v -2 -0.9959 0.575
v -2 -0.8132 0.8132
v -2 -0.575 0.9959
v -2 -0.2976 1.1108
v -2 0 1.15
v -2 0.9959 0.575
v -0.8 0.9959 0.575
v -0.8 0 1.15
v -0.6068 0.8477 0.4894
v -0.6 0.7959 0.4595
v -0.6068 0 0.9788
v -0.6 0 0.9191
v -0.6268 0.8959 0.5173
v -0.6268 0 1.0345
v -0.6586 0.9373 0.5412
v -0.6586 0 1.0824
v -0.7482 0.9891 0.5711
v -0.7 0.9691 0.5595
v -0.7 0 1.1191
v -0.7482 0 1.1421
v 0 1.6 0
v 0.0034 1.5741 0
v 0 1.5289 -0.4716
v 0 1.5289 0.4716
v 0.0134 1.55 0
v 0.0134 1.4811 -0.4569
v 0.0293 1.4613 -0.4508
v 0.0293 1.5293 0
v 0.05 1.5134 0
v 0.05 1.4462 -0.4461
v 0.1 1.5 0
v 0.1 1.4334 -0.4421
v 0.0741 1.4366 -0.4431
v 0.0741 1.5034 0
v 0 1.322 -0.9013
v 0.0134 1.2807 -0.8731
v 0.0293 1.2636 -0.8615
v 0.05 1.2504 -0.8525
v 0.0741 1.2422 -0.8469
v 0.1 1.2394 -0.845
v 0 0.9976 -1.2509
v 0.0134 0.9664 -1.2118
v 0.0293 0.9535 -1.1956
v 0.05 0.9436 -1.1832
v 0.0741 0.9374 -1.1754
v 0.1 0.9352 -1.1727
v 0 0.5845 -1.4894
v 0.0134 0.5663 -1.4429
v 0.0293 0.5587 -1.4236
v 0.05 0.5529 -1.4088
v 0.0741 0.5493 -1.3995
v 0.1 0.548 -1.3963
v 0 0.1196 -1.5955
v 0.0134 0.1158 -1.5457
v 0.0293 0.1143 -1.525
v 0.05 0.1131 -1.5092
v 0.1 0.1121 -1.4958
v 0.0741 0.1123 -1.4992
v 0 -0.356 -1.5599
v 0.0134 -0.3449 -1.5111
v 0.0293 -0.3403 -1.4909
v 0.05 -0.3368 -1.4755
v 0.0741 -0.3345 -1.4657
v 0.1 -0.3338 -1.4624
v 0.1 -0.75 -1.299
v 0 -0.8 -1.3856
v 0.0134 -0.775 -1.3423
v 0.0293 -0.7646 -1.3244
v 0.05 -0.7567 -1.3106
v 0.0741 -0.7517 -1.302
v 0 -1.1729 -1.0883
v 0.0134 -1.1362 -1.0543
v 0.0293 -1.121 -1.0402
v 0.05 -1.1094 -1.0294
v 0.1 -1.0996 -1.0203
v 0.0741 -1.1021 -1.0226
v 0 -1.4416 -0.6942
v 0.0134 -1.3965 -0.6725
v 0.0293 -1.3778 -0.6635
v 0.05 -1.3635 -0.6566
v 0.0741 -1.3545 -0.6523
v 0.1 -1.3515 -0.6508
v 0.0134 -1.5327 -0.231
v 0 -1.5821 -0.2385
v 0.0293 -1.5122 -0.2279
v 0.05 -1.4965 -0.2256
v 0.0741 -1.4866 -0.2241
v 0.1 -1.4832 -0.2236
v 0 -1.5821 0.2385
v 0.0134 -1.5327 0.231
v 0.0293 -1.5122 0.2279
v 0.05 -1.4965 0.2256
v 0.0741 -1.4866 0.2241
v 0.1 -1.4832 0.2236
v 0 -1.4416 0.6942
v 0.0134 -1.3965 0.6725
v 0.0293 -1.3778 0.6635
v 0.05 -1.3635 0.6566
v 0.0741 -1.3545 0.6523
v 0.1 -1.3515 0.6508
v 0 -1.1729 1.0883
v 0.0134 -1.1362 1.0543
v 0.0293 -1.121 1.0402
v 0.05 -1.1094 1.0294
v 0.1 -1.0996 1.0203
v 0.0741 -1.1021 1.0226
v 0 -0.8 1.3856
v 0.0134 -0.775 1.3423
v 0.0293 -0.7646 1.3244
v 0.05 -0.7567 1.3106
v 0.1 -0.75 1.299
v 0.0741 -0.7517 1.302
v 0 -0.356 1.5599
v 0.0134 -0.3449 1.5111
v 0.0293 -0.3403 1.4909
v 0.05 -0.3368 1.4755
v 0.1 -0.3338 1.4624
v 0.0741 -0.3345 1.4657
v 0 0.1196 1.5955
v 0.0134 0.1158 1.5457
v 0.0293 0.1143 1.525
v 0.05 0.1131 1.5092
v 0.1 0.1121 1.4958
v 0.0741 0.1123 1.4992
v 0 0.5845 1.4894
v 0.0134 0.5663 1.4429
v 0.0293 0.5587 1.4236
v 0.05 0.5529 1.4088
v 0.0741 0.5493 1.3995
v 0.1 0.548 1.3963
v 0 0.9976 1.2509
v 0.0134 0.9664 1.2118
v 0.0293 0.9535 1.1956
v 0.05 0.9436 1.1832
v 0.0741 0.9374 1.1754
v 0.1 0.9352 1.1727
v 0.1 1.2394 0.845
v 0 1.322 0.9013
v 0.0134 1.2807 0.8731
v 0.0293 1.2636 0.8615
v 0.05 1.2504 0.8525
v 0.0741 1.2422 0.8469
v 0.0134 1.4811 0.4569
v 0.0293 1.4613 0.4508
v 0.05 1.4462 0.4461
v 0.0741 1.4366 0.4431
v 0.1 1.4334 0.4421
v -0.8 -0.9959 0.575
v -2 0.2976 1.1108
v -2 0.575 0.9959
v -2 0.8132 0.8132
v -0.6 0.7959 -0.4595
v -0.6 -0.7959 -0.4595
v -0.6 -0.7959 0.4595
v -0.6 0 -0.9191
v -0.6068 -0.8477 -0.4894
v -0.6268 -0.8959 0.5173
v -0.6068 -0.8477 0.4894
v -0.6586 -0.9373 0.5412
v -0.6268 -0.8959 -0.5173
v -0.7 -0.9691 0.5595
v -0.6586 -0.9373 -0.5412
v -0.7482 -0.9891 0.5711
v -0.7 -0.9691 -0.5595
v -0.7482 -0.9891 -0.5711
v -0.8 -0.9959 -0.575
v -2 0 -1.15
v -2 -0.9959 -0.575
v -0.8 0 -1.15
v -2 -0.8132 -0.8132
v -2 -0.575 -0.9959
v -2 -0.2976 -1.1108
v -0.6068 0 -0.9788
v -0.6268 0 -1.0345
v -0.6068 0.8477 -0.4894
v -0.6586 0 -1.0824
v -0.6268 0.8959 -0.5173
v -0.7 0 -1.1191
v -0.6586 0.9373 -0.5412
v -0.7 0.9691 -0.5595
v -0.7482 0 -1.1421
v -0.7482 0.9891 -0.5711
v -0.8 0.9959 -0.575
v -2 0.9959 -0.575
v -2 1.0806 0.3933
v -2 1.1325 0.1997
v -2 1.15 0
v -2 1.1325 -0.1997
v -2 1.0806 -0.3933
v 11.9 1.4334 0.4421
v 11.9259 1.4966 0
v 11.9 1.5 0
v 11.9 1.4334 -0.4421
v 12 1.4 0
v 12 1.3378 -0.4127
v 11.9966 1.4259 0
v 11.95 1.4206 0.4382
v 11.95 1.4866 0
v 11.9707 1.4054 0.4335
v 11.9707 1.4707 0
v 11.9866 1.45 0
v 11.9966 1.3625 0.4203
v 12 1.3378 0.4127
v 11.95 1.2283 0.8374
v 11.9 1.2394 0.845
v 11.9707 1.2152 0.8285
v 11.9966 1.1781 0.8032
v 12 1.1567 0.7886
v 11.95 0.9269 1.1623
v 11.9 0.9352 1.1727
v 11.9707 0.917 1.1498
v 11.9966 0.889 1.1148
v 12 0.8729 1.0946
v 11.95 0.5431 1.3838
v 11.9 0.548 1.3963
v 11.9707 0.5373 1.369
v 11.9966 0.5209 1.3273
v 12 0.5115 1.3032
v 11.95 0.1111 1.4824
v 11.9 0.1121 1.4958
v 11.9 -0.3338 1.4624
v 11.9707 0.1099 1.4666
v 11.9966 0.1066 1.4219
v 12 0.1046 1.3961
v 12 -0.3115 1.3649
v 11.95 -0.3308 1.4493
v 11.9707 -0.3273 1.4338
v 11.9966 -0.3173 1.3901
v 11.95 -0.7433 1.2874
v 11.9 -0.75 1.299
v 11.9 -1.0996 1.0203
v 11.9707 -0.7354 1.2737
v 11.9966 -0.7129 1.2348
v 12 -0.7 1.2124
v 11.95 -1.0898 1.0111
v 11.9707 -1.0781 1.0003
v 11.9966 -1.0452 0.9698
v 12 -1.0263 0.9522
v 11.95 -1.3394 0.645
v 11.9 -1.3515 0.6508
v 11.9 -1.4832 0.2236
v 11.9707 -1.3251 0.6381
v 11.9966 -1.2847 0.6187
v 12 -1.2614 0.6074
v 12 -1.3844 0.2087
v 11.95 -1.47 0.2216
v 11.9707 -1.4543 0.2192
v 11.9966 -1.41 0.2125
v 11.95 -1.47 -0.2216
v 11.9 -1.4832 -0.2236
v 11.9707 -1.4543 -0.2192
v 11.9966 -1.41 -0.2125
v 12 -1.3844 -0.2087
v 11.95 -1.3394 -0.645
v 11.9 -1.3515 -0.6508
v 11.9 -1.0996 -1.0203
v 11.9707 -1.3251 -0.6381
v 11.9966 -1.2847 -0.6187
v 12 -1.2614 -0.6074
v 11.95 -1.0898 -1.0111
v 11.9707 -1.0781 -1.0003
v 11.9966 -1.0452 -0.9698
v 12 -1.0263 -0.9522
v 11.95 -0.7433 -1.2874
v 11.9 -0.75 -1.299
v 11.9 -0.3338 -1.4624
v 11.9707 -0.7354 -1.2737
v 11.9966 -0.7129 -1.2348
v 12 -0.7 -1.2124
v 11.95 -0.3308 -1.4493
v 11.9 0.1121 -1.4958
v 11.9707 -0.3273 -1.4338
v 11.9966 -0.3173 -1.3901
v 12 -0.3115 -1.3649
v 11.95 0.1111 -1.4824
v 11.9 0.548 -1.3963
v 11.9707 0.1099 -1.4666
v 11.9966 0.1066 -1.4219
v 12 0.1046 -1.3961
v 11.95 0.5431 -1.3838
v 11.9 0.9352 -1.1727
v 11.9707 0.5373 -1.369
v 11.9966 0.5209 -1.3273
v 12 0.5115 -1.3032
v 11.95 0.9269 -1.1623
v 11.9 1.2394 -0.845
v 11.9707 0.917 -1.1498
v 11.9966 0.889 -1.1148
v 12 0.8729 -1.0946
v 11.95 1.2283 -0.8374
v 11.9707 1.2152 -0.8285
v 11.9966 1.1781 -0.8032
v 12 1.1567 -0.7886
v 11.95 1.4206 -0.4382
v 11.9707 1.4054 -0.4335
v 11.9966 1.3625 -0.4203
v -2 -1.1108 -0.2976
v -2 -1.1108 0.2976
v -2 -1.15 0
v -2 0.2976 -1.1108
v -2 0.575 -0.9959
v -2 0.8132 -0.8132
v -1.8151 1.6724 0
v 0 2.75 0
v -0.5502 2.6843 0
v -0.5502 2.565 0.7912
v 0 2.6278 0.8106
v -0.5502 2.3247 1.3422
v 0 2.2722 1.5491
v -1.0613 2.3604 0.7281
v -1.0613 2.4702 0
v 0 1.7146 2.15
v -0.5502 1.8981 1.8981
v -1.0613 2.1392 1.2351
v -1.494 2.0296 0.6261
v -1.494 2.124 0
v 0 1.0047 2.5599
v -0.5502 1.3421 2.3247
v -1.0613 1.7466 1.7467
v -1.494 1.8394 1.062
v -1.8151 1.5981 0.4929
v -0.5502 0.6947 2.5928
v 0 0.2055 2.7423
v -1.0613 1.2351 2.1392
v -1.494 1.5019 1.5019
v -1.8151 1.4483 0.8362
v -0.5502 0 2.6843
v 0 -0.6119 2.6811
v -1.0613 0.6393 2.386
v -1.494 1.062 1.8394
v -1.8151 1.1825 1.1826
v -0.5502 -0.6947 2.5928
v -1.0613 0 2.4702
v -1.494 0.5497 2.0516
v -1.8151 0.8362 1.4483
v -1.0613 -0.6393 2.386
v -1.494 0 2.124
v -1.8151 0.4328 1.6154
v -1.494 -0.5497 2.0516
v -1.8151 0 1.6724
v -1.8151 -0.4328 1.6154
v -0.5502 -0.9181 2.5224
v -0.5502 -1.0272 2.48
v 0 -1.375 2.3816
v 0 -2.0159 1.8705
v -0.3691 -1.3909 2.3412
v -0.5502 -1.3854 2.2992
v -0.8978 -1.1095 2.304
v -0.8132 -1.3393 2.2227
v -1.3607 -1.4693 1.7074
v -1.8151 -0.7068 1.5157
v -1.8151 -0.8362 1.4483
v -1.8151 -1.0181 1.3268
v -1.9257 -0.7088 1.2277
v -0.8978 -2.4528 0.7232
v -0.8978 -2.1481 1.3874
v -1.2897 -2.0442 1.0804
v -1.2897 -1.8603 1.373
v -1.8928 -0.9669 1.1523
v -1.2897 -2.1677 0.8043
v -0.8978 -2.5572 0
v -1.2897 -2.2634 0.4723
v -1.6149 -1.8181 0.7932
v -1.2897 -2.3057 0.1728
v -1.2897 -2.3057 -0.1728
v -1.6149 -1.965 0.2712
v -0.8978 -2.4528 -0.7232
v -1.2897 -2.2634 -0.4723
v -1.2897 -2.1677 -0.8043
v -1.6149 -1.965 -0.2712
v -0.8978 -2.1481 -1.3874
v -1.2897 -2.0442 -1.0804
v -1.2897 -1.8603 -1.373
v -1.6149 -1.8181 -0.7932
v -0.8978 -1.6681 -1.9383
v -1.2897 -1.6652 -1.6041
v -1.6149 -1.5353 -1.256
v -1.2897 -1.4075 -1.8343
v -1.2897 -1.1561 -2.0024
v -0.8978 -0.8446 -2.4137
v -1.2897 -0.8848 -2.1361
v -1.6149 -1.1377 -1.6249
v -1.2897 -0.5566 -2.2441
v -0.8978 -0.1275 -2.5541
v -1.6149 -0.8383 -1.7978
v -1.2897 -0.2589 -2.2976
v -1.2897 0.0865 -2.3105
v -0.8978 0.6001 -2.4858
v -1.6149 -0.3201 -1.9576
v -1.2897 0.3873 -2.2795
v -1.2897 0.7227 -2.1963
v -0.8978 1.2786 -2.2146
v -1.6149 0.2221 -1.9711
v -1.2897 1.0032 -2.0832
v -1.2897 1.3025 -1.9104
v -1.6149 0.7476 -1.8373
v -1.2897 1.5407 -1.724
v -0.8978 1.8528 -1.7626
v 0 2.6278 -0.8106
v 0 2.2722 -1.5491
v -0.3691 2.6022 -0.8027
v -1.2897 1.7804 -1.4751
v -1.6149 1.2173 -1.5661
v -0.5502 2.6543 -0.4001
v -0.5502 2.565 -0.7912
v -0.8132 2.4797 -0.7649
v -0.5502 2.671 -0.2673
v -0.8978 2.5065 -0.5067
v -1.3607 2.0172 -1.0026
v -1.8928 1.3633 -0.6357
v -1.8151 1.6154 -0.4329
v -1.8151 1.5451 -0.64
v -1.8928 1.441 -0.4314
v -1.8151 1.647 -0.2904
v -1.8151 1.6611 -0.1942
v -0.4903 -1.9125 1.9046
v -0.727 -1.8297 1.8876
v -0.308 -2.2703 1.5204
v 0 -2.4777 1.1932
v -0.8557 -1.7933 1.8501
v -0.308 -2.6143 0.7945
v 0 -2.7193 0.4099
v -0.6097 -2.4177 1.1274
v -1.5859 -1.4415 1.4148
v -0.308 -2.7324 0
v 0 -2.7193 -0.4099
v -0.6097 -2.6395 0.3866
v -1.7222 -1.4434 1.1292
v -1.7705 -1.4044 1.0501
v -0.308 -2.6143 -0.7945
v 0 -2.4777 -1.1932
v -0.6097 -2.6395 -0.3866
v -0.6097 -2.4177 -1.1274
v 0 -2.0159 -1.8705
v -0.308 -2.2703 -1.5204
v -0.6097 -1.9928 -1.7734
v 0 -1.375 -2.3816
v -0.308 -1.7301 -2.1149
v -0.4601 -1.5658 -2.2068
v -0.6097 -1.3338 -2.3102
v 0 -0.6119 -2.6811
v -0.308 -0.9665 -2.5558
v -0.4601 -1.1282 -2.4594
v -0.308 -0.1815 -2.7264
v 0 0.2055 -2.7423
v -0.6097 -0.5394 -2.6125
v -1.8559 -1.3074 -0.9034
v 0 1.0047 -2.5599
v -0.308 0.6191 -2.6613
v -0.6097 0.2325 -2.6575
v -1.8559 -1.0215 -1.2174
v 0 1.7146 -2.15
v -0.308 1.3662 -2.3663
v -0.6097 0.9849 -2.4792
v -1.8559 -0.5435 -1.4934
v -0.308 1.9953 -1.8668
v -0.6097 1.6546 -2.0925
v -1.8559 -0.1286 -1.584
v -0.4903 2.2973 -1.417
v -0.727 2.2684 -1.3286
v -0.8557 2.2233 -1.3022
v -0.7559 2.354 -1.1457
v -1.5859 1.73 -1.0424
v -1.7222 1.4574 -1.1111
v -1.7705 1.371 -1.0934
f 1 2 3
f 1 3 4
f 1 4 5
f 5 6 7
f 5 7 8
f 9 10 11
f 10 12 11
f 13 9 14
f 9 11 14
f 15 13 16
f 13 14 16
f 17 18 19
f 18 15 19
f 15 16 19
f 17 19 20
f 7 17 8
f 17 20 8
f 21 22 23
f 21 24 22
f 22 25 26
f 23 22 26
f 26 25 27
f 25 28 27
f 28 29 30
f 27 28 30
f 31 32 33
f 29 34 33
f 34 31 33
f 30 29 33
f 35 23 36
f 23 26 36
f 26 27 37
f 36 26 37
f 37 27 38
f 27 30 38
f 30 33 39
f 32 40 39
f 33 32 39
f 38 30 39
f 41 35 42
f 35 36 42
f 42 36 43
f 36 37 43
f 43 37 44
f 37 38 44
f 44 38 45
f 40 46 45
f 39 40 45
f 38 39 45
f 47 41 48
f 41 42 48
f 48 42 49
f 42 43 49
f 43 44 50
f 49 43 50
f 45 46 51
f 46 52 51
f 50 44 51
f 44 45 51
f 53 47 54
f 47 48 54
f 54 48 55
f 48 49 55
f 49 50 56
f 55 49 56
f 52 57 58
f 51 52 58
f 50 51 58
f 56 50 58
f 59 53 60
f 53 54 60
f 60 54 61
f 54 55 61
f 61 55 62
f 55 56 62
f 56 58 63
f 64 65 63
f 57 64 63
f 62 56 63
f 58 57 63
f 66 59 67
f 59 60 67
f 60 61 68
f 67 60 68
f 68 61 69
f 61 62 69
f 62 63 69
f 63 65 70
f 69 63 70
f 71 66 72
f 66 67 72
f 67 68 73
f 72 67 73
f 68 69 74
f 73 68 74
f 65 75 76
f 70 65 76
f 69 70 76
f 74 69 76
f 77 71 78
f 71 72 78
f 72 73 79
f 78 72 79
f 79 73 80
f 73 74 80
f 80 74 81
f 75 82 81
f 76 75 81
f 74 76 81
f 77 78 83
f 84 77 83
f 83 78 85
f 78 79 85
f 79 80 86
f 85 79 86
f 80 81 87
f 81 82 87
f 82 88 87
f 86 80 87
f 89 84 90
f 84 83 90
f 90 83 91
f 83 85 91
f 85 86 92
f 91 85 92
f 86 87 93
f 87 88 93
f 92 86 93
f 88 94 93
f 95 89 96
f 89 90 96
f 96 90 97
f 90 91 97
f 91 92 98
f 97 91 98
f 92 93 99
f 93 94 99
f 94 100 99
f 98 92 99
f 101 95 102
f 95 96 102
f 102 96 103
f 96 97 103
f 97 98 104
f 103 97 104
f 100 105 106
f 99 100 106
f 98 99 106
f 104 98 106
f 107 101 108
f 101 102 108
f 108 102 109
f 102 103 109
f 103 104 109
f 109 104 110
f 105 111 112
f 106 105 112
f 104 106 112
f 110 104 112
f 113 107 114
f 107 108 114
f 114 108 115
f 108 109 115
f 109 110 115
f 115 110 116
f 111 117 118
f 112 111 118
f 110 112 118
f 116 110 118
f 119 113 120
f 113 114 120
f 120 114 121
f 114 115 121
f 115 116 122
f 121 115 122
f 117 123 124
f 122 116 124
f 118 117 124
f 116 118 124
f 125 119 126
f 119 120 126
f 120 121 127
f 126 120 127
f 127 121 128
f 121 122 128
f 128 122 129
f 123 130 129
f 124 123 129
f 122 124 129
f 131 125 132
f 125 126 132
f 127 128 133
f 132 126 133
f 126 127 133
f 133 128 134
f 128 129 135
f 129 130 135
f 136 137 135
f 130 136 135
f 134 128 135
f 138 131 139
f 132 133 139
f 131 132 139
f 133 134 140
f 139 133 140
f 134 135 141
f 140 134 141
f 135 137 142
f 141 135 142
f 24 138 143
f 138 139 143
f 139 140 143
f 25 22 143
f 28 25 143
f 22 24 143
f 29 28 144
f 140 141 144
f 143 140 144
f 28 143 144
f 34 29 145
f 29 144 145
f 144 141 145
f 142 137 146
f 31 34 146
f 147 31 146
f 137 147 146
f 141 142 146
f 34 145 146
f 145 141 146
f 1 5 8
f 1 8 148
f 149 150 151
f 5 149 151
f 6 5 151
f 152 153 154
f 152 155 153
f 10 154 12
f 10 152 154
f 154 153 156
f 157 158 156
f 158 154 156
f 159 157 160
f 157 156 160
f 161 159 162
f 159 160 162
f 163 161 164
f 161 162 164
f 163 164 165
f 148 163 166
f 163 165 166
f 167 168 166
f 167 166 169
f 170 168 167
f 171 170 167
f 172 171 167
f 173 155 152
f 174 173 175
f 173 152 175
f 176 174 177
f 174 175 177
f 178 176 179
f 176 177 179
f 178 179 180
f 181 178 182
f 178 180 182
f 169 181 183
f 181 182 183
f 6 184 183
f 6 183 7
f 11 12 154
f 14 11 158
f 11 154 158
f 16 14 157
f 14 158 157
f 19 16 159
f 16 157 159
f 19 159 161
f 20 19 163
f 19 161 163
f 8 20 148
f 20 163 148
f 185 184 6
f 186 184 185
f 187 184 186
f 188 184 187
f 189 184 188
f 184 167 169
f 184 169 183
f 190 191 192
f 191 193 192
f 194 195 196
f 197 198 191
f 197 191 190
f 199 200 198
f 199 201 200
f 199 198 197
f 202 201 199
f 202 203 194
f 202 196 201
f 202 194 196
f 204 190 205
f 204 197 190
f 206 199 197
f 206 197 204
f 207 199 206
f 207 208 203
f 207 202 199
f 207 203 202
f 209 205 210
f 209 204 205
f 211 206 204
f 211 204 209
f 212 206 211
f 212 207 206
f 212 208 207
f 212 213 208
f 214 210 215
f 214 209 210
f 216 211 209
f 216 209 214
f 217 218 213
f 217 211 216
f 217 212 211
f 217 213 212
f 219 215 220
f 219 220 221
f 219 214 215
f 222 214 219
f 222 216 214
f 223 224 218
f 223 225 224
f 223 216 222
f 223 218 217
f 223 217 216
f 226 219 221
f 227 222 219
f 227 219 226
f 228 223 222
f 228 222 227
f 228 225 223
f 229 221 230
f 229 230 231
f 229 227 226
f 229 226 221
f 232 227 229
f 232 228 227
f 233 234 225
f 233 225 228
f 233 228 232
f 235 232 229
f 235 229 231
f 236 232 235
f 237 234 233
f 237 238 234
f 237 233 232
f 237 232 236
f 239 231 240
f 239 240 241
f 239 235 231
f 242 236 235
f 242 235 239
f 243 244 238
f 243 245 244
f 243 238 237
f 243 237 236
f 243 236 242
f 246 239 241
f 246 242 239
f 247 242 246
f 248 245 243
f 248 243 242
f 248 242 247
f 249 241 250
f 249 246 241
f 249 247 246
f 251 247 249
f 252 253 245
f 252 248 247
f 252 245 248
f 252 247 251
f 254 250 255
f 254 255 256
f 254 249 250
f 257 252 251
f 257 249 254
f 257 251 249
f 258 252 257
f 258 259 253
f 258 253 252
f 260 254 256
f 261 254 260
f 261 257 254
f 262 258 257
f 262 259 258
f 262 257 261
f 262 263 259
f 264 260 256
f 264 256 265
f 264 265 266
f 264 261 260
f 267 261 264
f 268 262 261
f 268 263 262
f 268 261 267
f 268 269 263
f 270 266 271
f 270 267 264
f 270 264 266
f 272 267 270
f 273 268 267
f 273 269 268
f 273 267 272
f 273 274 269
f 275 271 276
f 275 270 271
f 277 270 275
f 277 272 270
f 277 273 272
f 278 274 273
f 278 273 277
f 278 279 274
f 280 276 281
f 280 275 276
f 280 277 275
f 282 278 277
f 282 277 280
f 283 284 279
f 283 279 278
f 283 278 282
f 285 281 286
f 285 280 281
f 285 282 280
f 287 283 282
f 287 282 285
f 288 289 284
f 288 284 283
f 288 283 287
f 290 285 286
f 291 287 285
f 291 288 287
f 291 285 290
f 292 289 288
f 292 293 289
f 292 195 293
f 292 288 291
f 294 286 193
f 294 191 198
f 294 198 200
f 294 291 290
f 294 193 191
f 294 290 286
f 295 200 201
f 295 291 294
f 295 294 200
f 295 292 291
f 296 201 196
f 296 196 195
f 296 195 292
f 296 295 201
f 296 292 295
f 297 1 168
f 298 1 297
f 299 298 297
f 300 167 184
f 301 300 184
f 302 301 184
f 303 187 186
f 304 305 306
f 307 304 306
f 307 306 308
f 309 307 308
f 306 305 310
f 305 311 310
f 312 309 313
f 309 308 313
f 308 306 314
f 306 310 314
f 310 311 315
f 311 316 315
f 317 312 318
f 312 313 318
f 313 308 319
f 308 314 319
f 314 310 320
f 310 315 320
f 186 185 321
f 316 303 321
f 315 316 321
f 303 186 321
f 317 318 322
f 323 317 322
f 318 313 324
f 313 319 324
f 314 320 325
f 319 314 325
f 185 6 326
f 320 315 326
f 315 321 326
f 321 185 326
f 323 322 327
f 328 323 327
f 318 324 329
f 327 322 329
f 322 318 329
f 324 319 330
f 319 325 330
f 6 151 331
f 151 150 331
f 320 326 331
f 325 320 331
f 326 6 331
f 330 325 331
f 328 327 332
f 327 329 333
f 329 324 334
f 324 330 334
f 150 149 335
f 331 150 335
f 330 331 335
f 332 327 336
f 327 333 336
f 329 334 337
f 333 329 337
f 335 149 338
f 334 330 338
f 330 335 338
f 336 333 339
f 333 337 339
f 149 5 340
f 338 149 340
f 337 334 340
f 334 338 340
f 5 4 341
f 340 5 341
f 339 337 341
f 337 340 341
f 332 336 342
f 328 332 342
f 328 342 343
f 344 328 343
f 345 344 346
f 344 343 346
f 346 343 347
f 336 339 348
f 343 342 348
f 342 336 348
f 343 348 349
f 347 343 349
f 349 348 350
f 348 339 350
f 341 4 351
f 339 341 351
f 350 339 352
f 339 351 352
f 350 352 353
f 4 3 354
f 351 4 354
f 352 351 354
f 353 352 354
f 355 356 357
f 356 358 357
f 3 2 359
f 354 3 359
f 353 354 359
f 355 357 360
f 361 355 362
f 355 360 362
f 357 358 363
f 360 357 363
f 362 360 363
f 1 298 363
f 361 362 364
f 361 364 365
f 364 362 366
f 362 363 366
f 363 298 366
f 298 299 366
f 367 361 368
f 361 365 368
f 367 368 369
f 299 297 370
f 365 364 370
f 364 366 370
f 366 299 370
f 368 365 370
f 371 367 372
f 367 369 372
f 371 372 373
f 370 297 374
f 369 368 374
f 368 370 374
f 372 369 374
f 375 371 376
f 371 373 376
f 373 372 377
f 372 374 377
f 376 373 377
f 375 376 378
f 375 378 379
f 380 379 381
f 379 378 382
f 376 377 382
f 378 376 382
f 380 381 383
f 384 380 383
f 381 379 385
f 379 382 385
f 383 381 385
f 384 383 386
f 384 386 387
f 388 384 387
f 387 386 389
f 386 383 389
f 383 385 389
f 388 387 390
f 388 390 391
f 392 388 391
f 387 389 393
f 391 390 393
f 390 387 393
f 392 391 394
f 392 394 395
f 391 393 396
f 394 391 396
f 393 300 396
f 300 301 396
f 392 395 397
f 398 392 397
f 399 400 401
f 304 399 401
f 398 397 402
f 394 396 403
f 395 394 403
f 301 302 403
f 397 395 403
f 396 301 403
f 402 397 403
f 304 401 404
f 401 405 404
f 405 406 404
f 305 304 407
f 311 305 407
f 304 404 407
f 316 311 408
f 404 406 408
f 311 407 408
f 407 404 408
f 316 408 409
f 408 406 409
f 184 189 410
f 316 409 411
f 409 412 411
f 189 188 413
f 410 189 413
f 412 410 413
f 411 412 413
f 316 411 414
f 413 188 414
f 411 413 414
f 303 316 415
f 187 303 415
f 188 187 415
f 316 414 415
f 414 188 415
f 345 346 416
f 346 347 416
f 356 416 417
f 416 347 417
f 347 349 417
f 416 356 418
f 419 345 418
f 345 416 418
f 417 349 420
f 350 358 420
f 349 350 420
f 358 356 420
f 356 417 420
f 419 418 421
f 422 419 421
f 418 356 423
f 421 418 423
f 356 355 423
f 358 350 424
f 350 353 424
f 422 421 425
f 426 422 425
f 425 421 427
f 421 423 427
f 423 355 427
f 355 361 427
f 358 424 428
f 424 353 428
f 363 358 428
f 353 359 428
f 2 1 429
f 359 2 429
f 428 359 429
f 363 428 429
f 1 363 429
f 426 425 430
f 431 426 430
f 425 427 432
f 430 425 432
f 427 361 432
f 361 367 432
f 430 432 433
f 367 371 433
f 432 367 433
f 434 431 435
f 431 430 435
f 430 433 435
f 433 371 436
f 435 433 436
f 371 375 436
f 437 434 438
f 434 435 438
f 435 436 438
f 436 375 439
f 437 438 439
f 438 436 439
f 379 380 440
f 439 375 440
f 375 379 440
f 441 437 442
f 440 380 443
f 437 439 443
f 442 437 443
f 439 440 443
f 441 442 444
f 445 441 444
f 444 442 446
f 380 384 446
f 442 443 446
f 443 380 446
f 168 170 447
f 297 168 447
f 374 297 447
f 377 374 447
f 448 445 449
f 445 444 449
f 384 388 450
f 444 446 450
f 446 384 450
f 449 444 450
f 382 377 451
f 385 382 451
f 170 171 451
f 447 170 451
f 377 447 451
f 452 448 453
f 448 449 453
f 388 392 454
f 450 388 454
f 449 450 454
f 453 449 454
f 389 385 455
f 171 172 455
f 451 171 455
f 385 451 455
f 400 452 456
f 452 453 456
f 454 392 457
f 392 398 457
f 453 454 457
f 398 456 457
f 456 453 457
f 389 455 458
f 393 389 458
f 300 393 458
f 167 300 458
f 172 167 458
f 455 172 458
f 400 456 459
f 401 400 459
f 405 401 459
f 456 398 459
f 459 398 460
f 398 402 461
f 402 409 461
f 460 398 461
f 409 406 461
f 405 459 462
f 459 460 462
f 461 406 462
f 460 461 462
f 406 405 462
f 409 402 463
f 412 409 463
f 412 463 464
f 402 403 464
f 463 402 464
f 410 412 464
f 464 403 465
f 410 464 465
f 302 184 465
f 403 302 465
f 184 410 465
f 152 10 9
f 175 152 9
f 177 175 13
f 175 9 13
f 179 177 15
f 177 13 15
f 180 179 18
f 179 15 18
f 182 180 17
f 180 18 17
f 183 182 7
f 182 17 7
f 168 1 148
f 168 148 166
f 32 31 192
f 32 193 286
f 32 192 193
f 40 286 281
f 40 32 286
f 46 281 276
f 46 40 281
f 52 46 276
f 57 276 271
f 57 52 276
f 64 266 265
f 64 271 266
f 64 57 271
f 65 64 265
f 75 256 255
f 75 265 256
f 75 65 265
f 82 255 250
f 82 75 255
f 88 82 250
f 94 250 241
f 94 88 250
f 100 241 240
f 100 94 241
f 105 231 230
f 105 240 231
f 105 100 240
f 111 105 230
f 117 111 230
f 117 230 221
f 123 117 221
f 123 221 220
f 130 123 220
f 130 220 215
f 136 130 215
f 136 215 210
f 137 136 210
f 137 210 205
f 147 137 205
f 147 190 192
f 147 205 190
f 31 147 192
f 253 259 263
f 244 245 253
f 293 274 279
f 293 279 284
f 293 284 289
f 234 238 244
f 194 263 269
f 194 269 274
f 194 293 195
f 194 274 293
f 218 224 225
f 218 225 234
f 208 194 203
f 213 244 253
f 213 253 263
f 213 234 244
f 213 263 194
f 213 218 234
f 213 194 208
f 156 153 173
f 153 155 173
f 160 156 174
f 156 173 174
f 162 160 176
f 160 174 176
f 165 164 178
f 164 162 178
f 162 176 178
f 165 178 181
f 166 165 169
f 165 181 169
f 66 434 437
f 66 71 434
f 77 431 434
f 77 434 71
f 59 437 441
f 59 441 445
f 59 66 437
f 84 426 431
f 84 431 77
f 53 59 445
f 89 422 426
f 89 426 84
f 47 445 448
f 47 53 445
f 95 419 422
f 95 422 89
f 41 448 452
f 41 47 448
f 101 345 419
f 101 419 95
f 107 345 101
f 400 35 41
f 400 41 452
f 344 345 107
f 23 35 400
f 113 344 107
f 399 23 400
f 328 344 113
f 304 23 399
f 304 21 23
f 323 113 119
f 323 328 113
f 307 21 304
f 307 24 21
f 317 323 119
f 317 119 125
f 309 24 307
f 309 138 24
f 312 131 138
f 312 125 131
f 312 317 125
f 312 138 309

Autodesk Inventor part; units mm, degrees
ref_plane "YZ Plane" through (0, 0, 0) normal (1, 0, 0) x (0, 1, 0)
ref_plane "XZ Plane" through (0, 0, 0) normal (0, 1, 0) x (-1, 0, 0)
ref_plane "XY Plane" through (0, 0, 0) normal (0, 0, 1) x (1, 0, 0)
sketch "スケッチ1" plane through (0, 0, 0) normal (0, 0, 1) x (1, 0, 0)
  line L0 (0, 0) -> (12, 0)
  line L1 (12, 0) -> (12, 1.5)
  line L2 (12, 1.5) -> (0, 1.5)
  line L3 (0, 1.5) -> (0, 0)
  line L4 (0, 0) -> (0, 2.75)
  line L5 (0, 0) -> (-2, 0)
  line L6 (-2, 0) -> (0, 0)
  line L7 (-2, 0) -> (-2, 1.15)
  arc A0 (0, 2.75) -> (-2, 1.15) centre (-0.0403, 0.7504) ccw
  dimension "d0" = 1.5
  dimension "d1" = 12
  dimension "d3" = 2
  dimension "d4" = 2.75
  dimension "d5" = 1.15
  dimension "d6" = 2
revolve "回転1" add sketch "スケッチ1" angle 360 about axis through (-2, 0, 0) along (1, 0, 0)
thread "ねじ1" size "M3x0.5" class "6g" standard "ANSI Metric M Profile" length 100
sketch "スケッチ2" plane through (-2, 0, 0) normal (-1, 0, 0) x (0, 0, 1)
  circle A0 centre (0, 0) radius 1.15 projected
  line L0 (-0.575, 0.9959) -> (0.575, 0.9959)
  line L1 (0.575, 0.9959) -> (1.15, 0)
  line L2 (1.15, 0) -> (0.575, -0.9959)
  line L3 (0.575, -0.9959) -> (-0.575, -0.9959)
  line L4 (-0.575, -0.9959) -> (-1.15, 0)
  line L5 (-1.15, 0) -> (-0.575, 0.9959)
  dimension "d10" = 1.15
  dimension "d11" = 1.9919
extrude "押し出し1" cut sketch "スケッチ2" against normal blind 1.4 contours L2 L3 L4 L5 L0 L1
fillet "フィレット1" radius 0.2 6 edges at (-0.6, 0.9959, 0) (-0.6, 0.498, 0.8625) (-0.6, 0.498, -0.8625) (-0.6, -0.498, -0.8625) (-0.6, -0.9959, 0) (-0.6, -0.498, 0.8625)
fillet "フィレット2" radius 0.1 1 edges at (0, -1.5, 0)
fillet "フィレット3" radius 0.1 1 edges at (12, -1.5, 0)
properties part number "ネジボタンM3L12" material "鋼"
